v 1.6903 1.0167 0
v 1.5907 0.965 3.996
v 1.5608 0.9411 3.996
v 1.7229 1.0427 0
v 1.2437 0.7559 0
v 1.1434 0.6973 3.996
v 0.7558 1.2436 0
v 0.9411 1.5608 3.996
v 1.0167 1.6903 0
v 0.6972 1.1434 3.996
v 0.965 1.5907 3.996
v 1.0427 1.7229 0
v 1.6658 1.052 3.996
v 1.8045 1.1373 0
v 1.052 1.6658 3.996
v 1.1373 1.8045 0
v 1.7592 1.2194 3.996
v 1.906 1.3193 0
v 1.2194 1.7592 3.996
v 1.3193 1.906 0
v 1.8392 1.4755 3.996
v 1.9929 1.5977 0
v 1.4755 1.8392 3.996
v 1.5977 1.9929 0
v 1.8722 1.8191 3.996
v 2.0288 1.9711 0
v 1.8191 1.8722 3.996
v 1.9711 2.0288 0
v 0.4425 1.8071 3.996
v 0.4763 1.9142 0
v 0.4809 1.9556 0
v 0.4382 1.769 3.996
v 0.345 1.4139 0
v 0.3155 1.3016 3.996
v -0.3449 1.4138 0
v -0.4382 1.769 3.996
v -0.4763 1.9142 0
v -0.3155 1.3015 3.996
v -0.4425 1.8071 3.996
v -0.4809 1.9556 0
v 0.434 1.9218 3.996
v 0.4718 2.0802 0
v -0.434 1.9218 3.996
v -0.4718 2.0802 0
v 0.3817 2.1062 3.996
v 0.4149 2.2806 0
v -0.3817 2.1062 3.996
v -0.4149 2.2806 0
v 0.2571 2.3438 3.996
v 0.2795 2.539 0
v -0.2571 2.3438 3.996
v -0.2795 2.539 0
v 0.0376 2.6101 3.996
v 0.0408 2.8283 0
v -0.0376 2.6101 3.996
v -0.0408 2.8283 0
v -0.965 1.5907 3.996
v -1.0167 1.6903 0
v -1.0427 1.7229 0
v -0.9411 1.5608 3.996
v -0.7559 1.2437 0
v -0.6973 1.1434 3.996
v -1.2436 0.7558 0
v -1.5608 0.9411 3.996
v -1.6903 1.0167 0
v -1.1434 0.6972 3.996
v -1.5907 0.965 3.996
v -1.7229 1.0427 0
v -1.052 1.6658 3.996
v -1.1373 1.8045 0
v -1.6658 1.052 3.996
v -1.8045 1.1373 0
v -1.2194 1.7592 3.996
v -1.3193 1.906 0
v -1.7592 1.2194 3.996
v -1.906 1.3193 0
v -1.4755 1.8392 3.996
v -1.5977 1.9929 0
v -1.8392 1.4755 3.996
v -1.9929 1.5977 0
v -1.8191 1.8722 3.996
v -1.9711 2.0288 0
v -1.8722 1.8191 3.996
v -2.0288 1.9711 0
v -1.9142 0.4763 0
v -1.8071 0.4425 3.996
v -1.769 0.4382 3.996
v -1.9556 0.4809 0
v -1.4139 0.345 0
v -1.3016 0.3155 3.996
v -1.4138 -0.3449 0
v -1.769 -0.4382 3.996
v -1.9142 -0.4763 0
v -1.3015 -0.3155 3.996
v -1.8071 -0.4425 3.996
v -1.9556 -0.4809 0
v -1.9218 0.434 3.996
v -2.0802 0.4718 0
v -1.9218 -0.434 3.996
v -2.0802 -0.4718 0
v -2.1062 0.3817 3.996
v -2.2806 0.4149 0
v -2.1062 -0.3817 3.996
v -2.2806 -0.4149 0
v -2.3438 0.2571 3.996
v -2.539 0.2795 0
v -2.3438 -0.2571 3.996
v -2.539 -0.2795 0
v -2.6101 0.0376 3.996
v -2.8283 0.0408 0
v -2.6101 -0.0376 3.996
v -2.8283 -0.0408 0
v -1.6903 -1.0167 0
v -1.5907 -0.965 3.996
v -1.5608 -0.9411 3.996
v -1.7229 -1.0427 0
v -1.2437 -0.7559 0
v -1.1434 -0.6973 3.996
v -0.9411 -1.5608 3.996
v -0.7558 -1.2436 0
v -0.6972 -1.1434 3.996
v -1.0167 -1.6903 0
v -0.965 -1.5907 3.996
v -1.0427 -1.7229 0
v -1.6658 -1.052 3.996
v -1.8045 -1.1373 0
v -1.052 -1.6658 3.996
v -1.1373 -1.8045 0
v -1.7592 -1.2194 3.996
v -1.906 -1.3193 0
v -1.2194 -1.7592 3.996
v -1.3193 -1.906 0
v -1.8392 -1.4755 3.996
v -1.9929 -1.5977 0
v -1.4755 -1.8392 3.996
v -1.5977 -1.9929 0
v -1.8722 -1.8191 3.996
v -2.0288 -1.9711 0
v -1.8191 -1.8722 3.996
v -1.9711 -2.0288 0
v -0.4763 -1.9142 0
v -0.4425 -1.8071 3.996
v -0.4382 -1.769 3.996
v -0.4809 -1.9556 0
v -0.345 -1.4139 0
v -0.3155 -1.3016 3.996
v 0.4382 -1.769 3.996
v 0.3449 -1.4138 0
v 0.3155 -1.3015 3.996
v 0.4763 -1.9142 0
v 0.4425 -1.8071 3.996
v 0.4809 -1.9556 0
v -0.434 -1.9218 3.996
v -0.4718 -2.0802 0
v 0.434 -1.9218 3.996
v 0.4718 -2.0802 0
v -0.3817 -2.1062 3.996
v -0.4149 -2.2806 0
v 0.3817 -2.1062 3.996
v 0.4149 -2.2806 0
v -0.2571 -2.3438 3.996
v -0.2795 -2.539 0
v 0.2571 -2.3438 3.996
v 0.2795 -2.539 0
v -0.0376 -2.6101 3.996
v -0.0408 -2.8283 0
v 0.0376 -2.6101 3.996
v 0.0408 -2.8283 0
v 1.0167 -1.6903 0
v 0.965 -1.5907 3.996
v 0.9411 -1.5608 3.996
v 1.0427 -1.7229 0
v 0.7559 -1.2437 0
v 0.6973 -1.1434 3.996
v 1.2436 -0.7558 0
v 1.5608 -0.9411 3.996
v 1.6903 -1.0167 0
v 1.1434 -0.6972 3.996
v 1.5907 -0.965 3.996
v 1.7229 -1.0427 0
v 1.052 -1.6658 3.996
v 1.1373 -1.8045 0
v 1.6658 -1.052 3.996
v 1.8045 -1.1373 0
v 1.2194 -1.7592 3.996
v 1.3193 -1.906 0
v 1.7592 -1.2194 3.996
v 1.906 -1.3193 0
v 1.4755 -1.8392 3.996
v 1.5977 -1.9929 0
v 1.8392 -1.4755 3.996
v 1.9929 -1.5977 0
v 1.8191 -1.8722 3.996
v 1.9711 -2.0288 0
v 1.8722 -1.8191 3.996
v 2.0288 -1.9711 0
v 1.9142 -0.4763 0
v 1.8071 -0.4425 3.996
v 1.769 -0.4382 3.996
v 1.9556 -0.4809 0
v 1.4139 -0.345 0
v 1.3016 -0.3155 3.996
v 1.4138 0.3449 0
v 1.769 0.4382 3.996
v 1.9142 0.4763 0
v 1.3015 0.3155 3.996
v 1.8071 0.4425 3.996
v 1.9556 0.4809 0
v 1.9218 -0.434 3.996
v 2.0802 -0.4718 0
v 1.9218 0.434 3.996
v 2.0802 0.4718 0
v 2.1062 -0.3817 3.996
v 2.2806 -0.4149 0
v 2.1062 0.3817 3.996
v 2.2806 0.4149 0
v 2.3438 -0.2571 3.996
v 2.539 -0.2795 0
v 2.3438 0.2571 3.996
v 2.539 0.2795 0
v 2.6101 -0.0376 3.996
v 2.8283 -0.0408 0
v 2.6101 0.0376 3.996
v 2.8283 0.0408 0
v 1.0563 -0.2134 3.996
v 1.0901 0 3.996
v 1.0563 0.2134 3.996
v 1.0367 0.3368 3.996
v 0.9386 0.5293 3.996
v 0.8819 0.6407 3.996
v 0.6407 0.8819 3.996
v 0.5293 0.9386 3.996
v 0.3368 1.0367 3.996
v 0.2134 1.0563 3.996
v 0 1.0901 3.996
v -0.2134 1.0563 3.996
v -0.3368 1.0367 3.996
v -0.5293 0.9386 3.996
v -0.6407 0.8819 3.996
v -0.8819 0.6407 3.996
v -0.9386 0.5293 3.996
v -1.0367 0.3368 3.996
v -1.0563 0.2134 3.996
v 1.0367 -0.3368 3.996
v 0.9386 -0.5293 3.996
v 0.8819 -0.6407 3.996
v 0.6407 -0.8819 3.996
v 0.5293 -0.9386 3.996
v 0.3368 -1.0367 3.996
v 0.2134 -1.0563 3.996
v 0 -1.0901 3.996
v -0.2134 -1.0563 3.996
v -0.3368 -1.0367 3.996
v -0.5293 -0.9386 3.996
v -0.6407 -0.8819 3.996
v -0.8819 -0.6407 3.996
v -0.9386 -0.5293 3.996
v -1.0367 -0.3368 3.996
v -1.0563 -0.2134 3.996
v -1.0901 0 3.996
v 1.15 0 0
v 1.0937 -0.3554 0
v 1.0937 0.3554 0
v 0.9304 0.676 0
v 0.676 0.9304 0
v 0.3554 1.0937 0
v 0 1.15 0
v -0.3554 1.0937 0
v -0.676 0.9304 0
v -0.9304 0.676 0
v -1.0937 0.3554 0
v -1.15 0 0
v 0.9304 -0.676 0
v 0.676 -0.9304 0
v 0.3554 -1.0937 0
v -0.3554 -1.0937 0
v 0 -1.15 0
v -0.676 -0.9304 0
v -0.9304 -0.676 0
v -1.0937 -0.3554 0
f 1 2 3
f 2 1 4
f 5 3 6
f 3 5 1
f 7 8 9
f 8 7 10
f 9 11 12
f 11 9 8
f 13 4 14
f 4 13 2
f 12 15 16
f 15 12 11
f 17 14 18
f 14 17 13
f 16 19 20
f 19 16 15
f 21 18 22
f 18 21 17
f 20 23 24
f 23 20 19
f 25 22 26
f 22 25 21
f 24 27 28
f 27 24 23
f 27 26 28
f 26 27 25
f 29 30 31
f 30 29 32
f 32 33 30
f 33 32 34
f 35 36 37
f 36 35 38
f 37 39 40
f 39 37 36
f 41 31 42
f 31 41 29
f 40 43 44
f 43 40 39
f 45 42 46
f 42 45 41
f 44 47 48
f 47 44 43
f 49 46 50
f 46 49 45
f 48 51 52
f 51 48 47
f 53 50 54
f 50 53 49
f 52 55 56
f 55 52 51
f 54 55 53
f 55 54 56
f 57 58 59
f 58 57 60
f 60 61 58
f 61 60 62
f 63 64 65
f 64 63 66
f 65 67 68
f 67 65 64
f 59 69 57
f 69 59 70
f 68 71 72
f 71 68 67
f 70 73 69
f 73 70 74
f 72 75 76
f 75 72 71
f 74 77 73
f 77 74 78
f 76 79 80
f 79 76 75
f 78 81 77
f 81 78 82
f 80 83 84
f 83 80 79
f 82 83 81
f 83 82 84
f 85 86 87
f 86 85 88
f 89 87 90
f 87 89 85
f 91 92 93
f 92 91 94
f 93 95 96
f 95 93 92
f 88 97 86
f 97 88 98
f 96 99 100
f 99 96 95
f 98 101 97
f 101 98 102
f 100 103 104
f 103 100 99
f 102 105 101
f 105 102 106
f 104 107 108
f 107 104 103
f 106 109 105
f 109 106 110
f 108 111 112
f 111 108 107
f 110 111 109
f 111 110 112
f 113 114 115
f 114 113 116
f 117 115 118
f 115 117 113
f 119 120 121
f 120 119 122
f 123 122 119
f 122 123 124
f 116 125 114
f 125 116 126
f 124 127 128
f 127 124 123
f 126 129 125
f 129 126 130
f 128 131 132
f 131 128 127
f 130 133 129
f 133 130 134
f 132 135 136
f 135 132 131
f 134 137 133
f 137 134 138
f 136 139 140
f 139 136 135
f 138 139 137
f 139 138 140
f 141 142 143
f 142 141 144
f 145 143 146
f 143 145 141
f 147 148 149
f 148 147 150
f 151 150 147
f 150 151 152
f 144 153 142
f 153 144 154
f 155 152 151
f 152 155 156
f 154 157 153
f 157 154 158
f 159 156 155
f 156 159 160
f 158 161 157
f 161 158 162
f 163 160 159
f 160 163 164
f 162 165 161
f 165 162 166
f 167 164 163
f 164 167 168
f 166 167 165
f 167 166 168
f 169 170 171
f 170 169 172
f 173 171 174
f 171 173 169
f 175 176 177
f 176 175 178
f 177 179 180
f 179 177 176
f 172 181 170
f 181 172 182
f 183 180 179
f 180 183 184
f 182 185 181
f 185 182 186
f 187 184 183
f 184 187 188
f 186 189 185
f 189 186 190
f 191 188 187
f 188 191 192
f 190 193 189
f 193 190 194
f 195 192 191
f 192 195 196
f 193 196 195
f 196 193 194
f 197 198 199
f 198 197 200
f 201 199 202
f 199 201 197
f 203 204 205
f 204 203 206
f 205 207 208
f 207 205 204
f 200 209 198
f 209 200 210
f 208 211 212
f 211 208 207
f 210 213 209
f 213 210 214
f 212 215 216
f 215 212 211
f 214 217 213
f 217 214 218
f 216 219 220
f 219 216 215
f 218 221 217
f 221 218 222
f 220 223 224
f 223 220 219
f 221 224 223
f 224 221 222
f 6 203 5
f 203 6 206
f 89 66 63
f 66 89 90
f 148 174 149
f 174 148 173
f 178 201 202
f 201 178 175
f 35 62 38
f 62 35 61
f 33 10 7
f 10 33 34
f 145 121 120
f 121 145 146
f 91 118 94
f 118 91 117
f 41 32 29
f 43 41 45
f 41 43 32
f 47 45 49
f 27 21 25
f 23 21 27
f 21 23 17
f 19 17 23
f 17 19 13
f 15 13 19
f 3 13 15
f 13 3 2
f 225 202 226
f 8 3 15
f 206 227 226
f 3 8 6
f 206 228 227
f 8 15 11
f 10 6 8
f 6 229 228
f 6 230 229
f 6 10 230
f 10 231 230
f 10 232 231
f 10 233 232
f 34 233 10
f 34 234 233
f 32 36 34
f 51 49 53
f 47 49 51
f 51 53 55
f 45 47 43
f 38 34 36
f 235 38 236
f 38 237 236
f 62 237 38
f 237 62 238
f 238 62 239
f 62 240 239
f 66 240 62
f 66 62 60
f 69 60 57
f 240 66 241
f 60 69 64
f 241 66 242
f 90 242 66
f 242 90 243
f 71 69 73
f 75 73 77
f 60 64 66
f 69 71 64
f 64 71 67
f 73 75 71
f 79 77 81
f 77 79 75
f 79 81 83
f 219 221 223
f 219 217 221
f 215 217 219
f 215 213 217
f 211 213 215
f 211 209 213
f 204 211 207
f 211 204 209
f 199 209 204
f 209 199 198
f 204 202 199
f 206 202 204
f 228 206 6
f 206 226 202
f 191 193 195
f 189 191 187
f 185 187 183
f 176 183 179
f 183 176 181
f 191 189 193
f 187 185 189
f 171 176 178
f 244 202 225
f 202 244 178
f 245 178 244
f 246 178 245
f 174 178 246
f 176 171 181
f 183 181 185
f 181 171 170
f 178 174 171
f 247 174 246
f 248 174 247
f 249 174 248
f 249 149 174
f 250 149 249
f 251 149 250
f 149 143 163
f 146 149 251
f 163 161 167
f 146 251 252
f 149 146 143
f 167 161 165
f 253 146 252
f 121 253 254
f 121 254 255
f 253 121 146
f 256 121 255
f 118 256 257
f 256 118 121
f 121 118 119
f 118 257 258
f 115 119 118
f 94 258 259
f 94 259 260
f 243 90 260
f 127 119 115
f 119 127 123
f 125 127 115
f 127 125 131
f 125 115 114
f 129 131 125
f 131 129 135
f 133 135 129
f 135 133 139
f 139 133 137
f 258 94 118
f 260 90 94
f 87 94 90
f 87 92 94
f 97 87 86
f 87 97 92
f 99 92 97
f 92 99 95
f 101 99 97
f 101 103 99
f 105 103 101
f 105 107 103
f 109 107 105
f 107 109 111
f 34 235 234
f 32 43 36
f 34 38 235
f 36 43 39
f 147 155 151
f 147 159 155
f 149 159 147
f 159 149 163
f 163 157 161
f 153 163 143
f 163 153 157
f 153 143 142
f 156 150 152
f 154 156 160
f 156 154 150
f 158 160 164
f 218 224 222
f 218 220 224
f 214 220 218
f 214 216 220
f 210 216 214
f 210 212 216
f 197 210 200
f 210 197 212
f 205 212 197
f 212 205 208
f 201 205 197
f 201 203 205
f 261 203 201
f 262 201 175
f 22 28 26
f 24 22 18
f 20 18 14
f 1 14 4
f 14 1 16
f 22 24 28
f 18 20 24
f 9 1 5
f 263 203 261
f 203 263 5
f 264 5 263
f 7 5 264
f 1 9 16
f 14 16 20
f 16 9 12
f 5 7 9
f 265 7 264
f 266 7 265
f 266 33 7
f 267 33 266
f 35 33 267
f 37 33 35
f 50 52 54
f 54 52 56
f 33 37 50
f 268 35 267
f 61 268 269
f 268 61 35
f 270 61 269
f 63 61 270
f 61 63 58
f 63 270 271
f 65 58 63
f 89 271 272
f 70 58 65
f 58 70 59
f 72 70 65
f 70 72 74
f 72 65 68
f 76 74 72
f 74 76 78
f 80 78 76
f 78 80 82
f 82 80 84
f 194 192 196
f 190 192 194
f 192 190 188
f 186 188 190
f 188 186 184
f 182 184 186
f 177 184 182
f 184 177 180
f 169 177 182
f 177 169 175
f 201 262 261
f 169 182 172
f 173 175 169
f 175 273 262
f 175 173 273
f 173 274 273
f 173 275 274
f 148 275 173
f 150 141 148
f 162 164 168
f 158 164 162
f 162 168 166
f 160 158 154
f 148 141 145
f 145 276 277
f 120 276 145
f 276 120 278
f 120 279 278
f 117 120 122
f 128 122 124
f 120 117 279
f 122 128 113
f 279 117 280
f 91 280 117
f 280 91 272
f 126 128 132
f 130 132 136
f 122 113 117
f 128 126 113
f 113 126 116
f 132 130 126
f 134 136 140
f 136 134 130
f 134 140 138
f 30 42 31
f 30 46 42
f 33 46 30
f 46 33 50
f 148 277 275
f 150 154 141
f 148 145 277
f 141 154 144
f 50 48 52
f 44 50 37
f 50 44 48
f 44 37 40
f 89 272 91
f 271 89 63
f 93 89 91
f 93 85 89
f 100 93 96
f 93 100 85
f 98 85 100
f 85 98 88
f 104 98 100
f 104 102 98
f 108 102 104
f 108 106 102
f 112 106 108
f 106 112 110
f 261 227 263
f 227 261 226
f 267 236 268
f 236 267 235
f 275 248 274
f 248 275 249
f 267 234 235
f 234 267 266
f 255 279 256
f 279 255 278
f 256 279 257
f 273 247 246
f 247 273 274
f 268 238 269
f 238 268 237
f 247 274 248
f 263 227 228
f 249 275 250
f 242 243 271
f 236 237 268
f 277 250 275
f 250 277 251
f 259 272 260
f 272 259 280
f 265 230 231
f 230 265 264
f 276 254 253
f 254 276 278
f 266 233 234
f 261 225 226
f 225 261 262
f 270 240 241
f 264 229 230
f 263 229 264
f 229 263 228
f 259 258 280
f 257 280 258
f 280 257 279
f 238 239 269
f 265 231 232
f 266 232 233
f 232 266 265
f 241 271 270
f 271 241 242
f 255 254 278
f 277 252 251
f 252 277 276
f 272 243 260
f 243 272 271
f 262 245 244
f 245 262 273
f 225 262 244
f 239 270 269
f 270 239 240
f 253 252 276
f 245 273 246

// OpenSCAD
use <MCAD/involute_gears.scad>

difference(){
    bevel_gear (
        number_of_teeth=8, 
        cone_distance=50, 
        face_width=4, 
        outside_circular_pitch=100, 
        pressure_angle=30,
        clearance = 0.2, 
        bore_diameter=0,
        gear_thickness = 2, 
        backlash = 0, 
        involute_facets=0, 
        finish = -1);

    cylinder(10, r1=1.15, $fn=20);

}
